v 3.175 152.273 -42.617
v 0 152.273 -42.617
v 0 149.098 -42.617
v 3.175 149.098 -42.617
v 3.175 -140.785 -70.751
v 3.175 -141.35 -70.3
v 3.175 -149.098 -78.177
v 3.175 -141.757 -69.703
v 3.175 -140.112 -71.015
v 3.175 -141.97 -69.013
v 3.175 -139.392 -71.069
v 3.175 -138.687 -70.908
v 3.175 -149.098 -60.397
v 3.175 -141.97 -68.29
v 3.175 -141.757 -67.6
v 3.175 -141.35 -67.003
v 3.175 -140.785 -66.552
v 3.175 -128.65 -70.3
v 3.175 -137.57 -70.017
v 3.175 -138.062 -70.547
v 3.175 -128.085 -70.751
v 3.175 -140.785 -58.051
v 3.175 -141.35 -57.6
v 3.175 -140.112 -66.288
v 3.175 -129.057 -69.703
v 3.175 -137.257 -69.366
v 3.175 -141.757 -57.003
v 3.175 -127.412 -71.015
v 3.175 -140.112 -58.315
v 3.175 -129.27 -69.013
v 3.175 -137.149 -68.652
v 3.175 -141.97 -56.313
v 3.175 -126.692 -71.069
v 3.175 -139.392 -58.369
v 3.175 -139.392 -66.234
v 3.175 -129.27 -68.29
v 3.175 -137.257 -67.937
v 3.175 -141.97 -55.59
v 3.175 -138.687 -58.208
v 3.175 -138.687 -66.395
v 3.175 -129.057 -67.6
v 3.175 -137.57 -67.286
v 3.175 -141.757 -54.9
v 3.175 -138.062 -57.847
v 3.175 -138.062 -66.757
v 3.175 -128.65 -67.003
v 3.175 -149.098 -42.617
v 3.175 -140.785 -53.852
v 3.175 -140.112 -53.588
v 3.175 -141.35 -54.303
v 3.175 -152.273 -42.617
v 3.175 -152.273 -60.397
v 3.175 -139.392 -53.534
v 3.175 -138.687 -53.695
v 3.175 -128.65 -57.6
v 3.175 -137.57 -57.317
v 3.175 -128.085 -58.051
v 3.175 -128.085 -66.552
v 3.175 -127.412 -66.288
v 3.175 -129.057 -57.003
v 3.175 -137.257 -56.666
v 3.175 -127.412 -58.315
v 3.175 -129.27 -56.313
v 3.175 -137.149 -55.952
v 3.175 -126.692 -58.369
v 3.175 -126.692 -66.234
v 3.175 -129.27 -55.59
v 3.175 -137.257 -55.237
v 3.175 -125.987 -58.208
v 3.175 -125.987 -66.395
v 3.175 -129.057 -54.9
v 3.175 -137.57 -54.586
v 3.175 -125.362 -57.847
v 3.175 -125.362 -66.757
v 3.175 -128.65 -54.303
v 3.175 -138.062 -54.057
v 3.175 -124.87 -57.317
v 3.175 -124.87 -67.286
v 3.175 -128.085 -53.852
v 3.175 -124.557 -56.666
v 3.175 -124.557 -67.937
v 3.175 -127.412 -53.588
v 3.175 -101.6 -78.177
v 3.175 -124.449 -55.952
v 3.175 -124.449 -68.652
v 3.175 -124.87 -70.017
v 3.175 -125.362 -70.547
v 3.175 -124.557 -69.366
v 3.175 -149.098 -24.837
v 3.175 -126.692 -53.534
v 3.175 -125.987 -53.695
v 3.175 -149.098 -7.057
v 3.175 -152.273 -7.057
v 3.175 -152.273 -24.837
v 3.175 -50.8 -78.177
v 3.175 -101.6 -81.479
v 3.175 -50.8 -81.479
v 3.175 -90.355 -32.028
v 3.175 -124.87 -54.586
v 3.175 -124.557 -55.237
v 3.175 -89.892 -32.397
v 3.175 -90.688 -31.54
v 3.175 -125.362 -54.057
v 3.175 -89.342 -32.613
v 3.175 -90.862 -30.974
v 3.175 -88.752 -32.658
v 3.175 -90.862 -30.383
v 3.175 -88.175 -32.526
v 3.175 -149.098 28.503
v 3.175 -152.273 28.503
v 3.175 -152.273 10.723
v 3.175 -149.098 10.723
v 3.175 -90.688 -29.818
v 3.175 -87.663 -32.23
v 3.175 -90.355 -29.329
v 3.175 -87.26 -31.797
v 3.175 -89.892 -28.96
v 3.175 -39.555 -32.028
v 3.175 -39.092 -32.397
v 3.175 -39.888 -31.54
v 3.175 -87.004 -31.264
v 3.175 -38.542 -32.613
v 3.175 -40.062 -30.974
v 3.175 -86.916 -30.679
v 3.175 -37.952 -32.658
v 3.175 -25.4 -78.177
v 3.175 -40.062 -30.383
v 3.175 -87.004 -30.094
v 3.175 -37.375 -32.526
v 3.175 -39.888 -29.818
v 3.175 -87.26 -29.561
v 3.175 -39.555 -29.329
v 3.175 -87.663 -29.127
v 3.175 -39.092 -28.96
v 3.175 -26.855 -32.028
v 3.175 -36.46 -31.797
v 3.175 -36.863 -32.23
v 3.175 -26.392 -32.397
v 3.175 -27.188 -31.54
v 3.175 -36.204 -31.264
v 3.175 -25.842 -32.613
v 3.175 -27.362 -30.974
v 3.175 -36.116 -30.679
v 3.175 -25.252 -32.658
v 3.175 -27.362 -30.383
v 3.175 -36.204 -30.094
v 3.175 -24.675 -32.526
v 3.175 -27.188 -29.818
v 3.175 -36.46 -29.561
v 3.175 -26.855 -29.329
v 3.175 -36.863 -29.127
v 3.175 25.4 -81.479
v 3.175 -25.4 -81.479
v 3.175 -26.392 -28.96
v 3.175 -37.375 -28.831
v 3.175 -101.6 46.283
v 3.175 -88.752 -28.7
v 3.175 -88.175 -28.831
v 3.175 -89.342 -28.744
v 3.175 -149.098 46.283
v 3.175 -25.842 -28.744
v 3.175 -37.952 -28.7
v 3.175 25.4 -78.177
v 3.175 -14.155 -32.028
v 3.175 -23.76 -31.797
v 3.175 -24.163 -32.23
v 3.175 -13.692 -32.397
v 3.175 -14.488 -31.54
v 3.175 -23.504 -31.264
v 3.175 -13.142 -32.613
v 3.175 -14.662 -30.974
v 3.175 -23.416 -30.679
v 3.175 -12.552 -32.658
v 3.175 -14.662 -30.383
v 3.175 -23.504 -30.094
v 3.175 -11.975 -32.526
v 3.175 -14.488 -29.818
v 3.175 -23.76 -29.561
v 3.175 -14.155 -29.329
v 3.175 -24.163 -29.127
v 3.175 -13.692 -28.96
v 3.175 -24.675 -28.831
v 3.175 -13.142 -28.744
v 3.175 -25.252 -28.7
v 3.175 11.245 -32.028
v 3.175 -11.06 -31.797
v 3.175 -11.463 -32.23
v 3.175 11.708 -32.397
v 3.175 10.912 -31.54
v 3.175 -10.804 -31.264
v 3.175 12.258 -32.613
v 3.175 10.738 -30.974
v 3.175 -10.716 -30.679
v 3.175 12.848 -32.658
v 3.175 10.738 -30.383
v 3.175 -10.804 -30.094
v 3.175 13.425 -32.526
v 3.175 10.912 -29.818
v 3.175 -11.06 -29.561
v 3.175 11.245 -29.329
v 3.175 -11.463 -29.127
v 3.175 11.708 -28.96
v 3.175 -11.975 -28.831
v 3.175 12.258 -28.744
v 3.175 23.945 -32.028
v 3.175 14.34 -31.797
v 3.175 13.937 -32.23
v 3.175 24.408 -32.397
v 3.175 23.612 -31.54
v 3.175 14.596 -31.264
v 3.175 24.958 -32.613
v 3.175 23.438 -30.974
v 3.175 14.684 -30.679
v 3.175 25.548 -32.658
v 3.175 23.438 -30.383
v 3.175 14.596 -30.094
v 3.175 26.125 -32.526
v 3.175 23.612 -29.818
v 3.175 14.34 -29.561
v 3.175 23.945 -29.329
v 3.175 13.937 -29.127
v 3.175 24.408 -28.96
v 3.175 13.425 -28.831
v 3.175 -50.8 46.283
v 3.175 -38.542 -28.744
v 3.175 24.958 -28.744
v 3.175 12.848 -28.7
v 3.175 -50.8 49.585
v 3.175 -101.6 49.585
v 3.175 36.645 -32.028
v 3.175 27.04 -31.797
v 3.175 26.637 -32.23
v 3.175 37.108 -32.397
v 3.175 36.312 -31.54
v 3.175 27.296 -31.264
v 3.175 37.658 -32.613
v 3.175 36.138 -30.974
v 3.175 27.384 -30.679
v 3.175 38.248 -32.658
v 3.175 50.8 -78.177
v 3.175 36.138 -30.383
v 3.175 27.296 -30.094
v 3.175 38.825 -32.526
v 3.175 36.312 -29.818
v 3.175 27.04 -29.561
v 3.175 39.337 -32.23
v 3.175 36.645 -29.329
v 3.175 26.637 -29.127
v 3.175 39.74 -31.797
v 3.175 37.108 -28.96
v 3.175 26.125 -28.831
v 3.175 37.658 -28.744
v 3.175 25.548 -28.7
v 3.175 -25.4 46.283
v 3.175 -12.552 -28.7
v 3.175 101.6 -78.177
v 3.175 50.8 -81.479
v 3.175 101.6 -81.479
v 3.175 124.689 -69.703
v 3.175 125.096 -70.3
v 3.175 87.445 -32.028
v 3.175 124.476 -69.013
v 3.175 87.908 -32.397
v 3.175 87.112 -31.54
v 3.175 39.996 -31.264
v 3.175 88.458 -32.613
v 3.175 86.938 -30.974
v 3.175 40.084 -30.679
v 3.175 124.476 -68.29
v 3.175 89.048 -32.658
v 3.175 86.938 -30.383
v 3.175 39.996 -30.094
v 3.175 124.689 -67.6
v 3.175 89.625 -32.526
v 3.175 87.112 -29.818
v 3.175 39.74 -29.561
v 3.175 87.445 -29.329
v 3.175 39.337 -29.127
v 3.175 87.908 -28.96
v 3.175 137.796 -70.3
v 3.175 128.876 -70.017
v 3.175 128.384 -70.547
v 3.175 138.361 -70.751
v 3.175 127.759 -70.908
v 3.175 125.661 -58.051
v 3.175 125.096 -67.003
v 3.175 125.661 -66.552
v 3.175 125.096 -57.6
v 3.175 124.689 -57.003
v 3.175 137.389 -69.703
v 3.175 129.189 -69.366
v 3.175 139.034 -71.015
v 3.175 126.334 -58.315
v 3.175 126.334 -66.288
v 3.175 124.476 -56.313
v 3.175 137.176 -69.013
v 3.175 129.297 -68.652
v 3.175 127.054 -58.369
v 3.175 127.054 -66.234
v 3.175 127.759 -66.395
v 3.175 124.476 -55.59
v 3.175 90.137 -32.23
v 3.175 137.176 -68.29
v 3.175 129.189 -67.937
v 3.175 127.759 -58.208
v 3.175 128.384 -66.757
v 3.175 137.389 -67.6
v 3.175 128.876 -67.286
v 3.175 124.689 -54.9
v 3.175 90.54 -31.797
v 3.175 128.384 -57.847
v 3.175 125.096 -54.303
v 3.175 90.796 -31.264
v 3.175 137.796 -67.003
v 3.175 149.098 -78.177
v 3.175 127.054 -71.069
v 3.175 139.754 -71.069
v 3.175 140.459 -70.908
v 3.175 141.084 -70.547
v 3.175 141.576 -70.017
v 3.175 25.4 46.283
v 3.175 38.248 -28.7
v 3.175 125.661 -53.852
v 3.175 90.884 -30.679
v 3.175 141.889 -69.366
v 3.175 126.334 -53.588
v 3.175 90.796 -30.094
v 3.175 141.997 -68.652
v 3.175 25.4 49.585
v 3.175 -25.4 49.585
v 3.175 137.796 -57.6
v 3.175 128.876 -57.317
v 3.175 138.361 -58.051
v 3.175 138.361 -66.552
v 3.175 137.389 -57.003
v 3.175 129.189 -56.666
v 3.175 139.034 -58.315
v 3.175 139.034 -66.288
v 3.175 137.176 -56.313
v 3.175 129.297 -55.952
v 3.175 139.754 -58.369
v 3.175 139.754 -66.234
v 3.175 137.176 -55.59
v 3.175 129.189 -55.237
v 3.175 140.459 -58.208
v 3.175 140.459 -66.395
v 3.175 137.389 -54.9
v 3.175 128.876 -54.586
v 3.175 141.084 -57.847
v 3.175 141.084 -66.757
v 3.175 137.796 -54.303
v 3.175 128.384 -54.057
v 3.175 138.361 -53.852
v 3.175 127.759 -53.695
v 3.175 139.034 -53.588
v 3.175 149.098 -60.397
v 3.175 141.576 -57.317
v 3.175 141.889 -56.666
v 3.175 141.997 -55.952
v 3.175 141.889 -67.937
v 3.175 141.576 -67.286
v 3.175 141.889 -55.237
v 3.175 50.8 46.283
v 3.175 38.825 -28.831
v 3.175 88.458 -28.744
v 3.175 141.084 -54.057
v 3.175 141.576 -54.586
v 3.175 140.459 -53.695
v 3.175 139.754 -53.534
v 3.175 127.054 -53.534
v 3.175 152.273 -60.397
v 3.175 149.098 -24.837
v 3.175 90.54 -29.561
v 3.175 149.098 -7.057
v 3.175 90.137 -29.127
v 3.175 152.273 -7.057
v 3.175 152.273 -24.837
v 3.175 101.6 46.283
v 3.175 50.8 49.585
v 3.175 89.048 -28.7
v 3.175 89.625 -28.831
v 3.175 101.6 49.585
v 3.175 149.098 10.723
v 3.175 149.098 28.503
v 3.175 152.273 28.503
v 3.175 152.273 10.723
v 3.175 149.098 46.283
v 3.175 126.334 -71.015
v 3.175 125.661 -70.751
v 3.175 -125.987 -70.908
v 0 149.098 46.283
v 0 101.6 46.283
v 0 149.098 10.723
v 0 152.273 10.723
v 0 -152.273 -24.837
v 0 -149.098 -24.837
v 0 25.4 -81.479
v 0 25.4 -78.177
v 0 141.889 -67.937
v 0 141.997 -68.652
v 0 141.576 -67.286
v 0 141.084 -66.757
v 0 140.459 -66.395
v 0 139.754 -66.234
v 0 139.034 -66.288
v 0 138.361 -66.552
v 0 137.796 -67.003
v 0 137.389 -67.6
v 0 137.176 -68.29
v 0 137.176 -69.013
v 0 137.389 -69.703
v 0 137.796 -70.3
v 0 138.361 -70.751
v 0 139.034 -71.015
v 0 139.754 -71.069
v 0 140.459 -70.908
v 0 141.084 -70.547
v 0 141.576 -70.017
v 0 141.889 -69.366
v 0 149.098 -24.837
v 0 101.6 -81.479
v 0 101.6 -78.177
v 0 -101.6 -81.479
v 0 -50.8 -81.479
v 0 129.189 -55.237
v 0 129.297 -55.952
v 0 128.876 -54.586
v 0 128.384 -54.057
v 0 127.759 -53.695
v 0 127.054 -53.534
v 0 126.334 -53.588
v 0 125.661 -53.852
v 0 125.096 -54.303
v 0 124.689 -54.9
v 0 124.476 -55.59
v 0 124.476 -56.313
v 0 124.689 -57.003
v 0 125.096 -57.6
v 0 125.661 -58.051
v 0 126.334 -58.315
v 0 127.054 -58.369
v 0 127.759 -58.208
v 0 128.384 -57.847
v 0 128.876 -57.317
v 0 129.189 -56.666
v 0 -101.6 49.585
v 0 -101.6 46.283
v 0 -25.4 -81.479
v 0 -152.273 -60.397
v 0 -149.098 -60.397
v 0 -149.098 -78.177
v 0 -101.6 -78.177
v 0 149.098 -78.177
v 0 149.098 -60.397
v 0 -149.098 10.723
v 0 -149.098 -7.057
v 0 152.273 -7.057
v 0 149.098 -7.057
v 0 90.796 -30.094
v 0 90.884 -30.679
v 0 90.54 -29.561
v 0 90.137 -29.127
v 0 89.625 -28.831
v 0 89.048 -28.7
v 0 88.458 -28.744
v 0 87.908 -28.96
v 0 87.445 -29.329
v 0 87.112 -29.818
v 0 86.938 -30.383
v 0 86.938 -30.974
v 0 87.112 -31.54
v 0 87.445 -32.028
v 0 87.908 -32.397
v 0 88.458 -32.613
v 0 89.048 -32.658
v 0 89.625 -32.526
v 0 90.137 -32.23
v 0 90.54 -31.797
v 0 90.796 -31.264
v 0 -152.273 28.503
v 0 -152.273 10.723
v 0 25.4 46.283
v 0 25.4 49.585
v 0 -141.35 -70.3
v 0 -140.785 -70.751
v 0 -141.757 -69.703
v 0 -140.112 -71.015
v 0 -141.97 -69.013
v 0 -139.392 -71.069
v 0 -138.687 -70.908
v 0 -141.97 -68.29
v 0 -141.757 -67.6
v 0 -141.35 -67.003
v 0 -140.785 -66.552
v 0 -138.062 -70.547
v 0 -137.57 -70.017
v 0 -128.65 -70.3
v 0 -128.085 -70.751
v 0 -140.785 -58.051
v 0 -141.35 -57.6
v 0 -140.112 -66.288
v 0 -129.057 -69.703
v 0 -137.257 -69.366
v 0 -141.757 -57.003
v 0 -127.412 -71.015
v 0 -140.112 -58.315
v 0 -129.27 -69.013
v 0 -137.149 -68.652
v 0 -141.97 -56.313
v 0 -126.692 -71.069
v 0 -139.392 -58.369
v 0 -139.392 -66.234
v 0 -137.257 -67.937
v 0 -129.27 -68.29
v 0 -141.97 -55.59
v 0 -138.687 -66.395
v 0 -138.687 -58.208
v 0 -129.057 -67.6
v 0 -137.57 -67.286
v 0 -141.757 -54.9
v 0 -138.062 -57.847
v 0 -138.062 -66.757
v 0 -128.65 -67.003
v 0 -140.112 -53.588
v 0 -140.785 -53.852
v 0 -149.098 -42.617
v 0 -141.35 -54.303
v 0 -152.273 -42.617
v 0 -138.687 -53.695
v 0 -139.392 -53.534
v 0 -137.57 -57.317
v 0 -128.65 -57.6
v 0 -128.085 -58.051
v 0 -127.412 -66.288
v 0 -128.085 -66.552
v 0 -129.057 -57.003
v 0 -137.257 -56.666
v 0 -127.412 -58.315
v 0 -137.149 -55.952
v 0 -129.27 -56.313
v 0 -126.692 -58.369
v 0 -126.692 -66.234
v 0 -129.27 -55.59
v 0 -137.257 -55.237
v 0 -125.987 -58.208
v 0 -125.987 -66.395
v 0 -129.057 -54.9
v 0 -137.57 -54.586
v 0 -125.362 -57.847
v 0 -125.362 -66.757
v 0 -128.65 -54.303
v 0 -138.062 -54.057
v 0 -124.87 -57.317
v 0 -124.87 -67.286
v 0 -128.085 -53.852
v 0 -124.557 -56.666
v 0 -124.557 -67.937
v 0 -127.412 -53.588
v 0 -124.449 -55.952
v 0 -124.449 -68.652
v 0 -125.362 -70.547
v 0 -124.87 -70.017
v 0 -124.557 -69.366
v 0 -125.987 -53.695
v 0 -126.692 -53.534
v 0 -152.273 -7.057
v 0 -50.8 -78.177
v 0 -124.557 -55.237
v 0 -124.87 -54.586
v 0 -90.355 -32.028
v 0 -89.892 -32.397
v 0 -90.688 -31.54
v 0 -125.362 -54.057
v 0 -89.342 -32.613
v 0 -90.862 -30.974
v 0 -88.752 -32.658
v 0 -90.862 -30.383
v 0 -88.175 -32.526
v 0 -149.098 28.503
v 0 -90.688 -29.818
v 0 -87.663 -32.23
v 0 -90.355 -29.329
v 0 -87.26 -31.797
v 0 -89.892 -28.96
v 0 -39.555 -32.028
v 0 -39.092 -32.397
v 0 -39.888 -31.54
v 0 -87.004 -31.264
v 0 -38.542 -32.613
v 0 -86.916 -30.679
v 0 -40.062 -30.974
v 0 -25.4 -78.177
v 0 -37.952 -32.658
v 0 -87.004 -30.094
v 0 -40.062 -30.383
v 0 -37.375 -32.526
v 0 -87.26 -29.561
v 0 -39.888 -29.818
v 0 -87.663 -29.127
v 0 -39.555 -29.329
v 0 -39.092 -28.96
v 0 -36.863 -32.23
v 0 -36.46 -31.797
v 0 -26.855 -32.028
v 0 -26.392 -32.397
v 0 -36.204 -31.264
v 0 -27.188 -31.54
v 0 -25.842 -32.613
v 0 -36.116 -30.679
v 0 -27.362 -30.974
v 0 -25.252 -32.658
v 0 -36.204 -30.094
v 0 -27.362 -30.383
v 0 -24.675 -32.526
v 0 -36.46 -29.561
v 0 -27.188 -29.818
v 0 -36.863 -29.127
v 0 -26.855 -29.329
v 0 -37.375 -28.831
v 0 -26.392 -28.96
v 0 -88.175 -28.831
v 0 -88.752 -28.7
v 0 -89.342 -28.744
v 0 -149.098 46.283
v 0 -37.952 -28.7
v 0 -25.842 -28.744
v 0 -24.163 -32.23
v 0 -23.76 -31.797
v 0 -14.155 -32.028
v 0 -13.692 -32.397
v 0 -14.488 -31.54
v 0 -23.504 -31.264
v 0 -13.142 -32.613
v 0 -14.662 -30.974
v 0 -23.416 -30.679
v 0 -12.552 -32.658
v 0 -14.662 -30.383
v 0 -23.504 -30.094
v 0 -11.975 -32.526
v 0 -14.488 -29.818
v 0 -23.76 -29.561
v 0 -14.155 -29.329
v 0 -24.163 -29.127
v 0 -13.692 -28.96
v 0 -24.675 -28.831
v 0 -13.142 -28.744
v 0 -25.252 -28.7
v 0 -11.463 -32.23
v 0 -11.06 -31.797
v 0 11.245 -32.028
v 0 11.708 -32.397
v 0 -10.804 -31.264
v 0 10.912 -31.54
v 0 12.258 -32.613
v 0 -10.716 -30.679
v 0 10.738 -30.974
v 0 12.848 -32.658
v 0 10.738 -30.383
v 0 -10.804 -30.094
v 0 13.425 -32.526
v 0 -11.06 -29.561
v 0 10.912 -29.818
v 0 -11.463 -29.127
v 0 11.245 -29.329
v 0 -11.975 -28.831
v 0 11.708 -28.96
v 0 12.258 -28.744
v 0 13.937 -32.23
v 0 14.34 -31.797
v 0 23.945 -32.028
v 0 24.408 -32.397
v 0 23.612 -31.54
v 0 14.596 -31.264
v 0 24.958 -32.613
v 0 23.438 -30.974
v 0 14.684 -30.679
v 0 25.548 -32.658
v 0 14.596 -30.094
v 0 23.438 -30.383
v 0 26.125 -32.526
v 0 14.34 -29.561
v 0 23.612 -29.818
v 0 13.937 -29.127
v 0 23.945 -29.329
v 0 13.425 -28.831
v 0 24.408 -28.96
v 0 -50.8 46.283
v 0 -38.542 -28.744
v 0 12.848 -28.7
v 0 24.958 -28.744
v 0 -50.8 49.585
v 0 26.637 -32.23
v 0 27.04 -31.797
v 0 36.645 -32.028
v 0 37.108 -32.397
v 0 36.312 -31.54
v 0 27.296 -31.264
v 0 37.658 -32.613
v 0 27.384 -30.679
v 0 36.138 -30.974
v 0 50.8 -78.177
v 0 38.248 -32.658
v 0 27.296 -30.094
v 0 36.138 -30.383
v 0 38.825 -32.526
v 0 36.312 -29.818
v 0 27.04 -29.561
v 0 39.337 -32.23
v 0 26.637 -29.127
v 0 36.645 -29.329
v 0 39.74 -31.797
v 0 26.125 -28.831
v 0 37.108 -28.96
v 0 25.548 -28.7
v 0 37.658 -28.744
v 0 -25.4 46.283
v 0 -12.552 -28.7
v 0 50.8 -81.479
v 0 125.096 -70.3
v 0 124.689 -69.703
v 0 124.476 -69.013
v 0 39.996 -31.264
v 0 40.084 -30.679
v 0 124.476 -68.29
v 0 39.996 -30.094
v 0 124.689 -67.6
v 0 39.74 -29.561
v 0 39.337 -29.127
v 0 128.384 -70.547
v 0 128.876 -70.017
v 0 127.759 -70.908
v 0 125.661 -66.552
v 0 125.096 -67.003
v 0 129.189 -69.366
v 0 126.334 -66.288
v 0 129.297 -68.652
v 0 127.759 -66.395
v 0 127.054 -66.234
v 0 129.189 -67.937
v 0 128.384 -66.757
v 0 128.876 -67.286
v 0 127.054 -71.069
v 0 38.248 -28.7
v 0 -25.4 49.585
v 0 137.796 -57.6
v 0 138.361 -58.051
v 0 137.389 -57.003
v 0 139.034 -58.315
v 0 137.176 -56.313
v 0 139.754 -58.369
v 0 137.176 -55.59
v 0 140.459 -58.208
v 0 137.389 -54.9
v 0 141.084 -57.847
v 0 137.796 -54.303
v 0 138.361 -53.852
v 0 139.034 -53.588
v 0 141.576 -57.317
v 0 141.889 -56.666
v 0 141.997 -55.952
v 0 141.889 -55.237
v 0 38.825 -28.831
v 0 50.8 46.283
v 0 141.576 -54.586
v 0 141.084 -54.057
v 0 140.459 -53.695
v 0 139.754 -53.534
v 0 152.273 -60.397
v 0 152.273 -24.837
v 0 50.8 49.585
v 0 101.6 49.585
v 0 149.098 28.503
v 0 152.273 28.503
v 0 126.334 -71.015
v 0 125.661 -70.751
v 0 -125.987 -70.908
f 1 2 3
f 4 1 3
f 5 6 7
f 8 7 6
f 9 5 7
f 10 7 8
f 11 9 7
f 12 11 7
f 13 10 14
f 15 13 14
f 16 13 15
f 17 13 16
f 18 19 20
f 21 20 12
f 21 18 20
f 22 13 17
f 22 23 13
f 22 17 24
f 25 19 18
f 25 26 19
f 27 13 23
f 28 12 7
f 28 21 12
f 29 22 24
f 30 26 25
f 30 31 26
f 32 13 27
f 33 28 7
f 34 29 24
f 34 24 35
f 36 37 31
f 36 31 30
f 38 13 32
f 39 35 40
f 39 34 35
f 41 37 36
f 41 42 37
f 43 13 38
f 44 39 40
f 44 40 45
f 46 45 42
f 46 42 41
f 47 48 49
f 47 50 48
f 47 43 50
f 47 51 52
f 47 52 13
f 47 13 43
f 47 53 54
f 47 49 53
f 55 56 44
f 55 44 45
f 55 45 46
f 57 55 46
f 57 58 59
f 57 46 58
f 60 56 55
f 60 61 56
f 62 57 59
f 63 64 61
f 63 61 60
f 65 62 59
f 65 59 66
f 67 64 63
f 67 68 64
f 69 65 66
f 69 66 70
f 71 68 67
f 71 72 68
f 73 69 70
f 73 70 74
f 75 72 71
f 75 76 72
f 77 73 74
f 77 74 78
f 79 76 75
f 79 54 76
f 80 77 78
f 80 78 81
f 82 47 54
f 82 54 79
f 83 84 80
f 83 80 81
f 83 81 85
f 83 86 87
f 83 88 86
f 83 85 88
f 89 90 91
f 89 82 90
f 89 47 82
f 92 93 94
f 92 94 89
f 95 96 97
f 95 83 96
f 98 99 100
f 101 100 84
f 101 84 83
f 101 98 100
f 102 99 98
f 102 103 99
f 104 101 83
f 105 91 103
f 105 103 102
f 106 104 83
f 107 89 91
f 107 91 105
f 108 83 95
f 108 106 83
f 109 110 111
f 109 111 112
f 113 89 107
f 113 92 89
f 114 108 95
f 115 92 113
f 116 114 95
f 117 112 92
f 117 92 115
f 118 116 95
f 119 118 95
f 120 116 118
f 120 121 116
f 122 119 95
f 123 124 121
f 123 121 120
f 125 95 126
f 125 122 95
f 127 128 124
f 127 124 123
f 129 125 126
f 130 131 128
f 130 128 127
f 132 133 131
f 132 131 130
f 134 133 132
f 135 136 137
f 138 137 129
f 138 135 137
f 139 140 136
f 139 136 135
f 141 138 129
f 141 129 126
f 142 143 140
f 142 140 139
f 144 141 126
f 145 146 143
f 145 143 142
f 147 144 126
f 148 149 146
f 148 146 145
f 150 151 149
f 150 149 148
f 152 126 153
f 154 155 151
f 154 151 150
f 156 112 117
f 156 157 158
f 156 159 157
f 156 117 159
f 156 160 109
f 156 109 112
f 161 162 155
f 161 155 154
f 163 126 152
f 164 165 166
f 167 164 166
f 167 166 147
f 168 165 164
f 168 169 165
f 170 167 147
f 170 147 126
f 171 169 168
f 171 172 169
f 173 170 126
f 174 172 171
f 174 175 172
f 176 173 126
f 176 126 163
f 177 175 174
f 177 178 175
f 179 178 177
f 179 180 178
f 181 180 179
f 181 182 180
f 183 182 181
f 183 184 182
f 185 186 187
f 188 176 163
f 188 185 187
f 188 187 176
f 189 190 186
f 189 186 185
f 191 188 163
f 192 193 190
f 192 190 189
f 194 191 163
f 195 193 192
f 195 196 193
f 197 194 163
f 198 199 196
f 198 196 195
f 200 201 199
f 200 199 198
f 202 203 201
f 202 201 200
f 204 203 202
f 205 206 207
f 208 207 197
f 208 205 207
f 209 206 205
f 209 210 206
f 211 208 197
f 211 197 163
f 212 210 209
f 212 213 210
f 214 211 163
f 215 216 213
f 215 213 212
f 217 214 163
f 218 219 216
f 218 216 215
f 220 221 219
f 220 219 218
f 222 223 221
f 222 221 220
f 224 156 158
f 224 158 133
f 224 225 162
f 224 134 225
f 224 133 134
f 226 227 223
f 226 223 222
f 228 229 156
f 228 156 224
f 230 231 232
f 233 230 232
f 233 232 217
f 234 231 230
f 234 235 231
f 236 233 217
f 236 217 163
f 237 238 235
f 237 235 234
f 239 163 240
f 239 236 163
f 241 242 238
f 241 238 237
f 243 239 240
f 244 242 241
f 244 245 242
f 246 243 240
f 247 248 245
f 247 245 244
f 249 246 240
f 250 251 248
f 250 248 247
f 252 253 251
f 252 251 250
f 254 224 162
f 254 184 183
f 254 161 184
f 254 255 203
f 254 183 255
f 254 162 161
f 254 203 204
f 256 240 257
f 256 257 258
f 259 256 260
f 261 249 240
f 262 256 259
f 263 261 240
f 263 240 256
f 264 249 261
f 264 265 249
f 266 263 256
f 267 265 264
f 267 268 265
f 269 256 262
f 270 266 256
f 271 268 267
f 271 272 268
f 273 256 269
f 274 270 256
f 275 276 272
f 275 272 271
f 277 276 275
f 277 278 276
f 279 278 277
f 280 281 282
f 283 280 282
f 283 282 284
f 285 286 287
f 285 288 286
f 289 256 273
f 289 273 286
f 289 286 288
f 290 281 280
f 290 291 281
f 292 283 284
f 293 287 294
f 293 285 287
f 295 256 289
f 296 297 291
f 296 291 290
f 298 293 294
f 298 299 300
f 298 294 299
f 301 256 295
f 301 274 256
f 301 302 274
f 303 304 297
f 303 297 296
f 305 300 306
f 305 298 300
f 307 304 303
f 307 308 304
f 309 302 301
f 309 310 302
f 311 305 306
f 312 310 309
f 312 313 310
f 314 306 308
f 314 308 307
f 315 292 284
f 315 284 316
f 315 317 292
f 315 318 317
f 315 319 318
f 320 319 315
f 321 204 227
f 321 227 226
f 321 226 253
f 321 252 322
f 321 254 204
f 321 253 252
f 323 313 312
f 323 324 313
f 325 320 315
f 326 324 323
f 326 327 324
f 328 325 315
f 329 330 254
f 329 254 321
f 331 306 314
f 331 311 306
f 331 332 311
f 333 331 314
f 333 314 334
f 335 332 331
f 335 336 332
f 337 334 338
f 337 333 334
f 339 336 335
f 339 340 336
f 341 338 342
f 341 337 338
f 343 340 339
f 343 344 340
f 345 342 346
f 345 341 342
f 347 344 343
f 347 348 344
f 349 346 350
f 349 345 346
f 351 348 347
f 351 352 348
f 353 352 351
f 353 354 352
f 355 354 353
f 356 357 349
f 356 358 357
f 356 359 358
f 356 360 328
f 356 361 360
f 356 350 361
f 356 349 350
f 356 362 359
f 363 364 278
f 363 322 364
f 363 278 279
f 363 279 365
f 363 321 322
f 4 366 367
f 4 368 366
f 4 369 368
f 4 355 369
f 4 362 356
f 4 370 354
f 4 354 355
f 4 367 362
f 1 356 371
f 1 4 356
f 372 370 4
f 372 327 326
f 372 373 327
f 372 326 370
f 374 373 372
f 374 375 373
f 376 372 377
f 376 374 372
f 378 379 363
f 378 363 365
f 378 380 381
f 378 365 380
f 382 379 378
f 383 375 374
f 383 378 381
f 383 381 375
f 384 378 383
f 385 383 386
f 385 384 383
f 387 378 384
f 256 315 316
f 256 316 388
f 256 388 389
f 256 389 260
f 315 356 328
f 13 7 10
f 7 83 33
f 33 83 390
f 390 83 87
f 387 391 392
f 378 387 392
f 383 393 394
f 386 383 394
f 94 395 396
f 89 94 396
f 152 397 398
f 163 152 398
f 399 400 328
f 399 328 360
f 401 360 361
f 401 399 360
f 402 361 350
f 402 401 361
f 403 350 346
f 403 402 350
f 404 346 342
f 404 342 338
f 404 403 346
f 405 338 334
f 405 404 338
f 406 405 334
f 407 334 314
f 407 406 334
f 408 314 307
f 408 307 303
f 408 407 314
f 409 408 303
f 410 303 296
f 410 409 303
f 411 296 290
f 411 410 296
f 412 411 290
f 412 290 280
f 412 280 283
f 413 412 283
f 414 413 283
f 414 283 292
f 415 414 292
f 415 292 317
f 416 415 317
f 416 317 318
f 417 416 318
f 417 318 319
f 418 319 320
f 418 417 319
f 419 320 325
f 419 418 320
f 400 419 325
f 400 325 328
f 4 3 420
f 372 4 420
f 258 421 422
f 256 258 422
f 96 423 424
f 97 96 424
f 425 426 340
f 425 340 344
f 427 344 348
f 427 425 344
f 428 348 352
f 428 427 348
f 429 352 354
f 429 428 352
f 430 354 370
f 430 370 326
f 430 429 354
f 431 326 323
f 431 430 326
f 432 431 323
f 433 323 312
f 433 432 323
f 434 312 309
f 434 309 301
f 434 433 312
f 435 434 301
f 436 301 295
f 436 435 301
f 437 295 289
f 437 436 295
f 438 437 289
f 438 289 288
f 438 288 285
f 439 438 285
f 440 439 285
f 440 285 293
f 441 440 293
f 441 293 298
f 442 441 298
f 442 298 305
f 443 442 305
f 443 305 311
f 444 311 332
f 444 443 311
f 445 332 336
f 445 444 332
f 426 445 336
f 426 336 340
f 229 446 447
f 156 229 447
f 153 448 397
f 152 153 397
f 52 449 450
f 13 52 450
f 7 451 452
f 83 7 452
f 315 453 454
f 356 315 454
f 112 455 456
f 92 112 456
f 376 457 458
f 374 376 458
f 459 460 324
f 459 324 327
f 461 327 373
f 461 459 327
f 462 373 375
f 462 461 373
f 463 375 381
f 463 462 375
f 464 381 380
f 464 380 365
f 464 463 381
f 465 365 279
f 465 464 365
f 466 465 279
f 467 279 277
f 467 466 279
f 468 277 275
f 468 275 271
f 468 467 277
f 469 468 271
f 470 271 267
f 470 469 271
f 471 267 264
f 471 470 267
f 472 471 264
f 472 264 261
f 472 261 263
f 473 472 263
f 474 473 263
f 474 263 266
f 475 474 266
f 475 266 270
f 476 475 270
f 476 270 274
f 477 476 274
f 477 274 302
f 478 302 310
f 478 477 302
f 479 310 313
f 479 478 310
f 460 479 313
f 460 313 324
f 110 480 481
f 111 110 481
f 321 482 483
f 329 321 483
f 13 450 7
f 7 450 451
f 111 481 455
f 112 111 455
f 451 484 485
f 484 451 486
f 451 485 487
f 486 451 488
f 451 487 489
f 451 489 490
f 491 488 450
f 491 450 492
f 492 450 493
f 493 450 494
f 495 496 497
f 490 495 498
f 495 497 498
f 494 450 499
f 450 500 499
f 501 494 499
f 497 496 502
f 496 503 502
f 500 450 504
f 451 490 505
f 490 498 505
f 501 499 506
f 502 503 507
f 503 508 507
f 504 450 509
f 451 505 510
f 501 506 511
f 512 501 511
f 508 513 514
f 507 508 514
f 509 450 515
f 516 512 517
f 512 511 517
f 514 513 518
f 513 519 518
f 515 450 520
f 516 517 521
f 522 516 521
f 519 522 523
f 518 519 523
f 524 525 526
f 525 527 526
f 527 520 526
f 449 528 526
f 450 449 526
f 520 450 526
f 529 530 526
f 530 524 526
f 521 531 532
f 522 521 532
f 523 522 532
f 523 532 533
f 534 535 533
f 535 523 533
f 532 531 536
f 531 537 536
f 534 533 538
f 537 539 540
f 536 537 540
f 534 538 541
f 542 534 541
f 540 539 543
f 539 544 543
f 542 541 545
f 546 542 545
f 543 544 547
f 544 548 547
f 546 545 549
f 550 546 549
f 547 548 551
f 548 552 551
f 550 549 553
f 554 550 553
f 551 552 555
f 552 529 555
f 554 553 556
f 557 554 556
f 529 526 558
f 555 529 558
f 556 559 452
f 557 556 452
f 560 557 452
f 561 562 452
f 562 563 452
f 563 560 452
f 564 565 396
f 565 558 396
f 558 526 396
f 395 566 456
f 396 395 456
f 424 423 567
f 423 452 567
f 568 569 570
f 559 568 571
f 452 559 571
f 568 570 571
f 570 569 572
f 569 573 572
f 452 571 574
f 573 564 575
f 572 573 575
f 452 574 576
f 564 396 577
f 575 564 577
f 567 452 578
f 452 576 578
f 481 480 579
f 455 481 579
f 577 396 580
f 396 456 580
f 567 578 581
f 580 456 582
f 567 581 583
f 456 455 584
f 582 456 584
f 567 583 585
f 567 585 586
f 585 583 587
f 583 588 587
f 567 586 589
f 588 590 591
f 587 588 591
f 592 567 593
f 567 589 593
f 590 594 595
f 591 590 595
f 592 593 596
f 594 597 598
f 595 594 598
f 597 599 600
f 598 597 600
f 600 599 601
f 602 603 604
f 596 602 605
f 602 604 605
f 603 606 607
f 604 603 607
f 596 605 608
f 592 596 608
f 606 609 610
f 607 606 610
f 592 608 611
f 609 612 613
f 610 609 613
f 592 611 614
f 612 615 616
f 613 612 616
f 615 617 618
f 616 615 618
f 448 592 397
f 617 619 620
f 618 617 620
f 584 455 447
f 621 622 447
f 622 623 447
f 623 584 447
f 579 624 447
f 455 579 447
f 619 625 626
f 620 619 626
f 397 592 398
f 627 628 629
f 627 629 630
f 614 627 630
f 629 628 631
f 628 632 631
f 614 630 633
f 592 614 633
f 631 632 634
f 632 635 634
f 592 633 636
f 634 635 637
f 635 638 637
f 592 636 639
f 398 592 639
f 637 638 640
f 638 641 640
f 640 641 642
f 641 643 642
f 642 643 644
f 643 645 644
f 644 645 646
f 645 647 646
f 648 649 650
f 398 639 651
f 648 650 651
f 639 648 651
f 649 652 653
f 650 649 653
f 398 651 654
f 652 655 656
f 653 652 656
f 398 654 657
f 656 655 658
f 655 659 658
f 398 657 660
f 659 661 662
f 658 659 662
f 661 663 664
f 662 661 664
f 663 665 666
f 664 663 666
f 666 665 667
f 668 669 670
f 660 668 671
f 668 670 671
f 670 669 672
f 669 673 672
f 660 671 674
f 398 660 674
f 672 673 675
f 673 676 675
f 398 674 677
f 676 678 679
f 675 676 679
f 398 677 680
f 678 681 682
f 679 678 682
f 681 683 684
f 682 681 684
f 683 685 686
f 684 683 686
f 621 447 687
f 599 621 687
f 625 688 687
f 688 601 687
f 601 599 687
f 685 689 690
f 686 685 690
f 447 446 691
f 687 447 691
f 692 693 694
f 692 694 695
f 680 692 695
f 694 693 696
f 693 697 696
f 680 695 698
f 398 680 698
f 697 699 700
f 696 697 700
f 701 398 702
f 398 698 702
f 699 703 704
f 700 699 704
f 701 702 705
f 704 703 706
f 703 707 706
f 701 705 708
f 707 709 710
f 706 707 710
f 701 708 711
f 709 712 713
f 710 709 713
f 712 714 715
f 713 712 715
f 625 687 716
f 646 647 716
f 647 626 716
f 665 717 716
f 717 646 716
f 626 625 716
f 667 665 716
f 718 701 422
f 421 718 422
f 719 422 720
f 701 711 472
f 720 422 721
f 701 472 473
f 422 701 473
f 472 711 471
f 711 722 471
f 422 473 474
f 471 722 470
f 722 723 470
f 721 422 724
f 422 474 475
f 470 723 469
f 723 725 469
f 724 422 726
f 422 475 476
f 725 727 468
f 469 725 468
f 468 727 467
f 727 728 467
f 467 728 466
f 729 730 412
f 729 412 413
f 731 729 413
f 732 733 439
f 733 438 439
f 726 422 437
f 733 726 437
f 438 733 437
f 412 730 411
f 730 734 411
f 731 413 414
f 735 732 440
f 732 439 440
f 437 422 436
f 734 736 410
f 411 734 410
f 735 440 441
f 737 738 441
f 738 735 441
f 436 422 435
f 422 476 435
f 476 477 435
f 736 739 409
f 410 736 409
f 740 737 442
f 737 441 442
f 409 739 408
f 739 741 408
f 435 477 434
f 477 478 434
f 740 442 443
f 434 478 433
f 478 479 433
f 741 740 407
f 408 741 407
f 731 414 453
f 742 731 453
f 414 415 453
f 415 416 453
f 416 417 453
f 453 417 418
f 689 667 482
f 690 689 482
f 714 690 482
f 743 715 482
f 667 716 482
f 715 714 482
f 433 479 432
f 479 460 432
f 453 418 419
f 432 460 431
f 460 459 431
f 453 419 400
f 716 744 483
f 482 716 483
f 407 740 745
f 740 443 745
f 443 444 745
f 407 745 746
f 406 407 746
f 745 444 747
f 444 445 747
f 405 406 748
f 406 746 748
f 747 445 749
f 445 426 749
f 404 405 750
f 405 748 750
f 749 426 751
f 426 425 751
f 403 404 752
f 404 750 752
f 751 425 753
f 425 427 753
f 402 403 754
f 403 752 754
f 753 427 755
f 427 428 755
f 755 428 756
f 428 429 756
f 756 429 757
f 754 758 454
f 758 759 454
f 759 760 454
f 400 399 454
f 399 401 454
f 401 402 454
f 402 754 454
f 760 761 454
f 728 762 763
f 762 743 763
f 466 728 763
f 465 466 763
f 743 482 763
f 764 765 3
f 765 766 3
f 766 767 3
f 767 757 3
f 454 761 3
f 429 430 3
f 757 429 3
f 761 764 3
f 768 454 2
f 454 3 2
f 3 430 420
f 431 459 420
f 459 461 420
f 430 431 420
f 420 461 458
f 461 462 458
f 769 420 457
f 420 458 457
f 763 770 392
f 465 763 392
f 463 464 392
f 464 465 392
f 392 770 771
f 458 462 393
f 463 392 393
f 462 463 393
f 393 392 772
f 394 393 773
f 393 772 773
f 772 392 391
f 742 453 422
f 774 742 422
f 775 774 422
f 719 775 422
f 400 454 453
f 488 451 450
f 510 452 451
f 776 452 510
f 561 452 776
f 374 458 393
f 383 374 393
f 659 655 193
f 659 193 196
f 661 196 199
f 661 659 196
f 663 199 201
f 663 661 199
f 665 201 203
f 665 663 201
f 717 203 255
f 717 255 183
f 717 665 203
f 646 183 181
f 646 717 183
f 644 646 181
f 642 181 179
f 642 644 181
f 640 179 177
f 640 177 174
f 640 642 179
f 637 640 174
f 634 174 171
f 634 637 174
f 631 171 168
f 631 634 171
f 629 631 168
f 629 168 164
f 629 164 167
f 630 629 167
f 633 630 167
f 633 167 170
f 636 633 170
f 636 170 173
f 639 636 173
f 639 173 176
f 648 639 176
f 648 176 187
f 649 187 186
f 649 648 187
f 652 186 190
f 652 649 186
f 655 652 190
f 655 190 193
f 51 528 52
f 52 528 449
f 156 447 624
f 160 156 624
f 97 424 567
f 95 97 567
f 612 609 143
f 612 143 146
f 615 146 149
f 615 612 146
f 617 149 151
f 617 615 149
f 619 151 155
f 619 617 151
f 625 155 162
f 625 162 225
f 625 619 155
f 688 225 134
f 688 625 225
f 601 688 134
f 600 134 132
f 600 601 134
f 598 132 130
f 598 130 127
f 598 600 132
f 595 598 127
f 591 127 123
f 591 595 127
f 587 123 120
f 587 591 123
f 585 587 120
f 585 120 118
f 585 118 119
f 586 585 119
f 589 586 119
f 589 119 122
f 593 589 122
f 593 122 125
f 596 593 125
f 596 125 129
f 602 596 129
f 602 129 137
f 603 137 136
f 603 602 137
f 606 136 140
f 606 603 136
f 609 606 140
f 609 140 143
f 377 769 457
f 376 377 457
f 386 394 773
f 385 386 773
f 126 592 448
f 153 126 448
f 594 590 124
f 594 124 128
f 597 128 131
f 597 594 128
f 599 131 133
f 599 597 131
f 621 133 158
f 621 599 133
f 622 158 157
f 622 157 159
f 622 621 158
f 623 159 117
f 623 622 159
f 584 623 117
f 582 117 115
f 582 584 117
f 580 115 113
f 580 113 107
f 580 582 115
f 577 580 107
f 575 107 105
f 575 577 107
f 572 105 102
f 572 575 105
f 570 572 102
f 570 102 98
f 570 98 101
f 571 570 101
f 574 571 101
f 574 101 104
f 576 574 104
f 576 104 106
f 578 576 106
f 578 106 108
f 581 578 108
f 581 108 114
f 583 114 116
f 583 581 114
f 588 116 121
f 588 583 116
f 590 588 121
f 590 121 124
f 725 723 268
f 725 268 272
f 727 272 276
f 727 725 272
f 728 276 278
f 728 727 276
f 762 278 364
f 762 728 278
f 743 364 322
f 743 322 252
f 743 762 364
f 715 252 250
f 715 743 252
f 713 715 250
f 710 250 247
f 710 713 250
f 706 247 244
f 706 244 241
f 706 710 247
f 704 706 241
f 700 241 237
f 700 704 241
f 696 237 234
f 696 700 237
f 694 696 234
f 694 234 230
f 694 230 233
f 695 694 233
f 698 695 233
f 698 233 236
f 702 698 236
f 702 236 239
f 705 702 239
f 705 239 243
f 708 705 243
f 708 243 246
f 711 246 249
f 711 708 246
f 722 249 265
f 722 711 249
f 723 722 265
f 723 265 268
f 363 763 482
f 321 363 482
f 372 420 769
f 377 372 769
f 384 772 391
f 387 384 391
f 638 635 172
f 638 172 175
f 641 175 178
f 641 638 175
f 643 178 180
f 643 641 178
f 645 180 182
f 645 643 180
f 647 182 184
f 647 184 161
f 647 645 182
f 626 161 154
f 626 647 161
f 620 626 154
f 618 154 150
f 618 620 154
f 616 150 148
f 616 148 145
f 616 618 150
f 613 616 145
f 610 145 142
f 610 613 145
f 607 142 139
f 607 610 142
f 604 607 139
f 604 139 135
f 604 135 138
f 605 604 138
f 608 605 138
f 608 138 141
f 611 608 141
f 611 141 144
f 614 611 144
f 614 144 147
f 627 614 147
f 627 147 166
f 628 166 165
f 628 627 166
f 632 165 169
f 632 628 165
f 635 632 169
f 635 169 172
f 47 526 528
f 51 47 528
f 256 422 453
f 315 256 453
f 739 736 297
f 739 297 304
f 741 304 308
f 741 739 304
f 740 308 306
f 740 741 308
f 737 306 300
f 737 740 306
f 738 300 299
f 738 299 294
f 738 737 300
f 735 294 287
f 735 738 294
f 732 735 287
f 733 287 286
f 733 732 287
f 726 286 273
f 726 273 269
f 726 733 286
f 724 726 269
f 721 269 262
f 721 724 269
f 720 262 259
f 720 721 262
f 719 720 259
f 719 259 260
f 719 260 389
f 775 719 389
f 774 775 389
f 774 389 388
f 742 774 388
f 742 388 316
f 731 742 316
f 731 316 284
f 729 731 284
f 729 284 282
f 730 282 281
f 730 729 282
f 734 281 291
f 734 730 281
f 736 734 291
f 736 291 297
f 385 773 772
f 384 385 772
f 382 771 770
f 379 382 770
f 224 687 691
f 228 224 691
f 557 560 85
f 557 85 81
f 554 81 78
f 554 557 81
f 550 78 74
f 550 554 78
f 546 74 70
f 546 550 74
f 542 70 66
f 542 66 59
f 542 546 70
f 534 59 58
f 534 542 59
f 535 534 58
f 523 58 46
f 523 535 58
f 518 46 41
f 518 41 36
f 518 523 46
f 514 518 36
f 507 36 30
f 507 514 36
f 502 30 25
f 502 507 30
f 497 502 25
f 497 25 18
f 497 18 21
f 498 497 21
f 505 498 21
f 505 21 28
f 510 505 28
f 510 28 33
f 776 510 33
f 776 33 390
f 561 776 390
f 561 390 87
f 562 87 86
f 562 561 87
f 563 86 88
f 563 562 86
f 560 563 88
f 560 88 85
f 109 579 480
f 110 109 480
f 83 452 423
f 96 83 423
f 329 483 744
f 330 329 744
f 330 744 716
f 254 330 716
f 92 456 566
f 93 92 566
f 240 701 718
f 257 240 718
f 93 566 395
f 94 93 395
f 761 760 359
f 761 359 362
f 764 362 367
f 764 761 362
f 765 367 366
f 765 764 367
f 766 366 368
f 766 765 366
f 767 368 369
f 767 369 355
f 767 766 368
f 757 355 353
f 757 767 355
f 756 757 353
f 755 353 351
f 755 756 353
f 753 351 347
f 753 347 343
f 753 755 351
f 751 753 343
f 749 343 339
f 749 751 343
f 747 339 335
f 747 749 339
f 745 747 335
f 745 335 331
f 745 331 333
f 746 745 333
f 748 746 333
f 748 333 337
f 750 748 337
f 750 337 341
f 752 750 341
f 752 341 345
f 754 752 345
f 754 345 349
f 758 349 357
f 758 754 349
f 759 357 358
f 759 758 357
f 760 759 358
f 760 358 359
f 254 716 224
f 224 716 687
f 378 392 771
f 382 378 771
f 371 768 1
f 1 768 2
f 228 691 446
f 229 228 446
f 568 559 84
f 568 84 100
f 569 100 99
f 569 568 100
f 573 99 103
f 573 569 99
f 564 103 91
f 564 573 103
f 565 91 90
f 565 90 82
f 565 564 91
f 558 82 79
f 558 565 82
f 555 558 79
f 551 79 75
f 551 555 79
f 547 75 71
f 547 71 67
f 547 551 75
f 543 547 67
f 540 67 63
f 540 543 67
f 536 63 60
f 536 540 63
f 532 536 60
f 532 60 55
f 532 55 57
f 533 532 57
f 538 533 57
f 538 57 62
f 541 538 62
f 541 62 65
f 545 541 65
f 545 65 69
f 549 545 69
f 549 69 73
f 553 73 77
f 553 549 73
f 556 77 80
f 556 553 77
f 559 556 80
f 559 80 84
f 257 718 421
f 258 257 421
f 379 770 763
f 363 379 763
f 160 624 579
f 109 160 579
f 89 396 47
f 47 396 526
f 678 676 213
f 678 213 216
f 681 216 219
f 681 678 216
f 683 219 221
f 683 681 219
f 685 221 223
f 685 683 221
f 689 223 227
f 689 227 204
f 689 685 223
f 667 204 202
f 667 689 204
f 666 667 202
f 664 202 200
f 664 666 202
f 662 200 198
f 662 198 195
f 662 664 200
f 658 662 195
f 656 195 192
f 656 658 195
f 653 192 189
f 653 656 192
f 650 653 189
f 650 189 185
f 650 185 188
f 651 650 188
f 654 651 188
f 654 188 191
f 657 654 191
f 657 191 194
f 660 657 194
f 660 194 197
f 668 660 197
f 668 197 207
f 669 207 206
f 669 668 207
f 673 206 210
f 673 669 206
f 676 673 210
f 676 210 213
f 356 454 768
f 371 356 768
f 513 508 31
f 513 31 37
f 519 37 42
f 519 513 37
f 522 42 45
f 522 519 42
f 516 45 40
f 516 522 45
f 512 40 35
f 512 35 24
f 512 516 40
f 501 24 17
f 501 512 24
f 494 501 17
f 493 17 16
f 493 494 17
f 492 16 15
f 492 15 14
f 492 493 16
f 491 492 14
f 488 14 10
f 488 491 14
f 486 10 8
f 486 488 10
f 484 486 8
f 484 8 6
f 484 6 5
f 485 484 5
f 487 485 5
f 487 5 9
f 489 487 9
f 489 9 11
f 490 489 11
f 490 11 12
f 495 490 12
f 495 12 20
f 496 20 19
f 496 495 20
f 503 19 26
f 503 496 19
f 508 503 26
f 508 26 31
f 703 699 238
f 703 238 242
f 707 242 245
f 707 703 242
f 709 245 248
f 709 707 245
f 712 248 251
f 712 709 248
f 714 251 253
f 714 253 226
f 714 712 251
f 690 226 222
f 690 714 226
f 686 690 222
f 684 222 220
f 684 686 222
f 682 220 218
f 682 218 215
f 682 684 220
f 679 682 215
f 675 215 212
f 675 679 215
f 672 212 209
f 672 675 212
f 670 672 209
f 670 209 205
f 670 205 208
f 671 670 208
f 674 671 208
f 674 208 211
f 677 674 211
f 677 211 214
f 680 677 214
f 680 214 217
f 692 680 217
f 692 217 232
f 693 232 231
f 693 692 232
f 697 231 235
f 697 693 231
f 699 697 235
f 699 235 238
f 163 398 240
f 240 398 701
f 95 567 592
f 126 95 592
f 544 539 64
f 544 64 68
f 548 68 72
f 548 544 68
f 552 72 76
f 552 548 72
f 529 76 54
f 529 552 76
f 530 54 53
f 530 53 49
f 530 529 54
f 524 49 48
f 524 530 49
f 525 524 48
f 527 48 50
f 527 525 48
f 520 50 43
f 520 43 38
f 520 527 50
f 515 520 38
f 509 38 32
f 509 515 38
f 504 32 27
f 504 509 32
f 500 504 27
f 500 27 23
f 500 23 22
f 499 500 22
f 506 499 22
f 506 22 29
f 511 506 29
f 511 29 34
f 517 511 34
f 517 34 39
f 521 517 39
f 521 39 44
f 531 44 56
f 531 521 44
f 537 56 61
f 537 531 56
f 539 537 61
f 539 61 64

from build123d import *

# Parameters (mm, degrees)
F0_R     = 2.424029
F0_R_2   = 1.984375
F1_DEPTH = 3.175


with BuildPart() as f1:
    # F0 (on Right) → F1 (new body)
    with BuildSketch(Plane.YZ):
        Polygon((-101.6, -81.478684), (-50.8, -81.478684), (-50.8, -78.176684), (-25.4, -78.176684), (-25.4, -81.478684), (25.4, -81.478684), (25.4, -78.176684), (50.8, -78.176684), (50.8, -81.478684), (101.6, -81.478684), (101.6, -78.176684), (149.098, -78.176684), (149.098, -60.396684), (152.273, -60.396684), (152.273, -42.616684), (149.098, -42.616684), (149.098, -24.836684), (152.273, -24.836684), (152.273, -7.056684), (149.098, -7.056684), (149.098, 10.723316), (152.273, 10.723316), (152.273, 28.503316), (149.098, 28.503316), (149.098, 46.283316), (101.6, 46.283316), (101.6, 49.585316), (50.8, 49.585316), (50.8, 46.283316), (25.4, 46.283316), (25.4, 49.585316), (-25.4, 49.585316), (-25.4, 46.283316), (-50.8, 46.283316), (-50.8, 49.585316), (-101.6, 49.585316), (-101.6, 46.283316), (-149.098, 46.283316), (-149.098, 28.503316), (-152.273, 28.503316), (-152.273, 10.723316), (-149.098, 10.723316), (-149.098, -7.056684), (-152.273, -7.056684), (-152.273, -24.836684), (-149.098, -24.836684), (-149.098, -42.616684), (-152.273, -42.616684), (-152.273, -60.396684), (-149.098, -60.396684), (-149.098, -78.176684), (-101.6, -78.176684), align=None)
        with Locations((-139.573, -68.651684)):
            Circle(F0_R, mode=Mode.SUBTRACT)
        with Locations((-126.873, -68.651684)):
            Circle(F0_R, mode=Mode.SUBTRACT)
        with Locations((-139.573, -55.951684)):
            Circle(F0_R, mode=Mode.SUBTRACT)
        with Locations((-126.873, -55.951684)):
            Circle(F0_R, mode=Mode.SUBTRACT)
        with Locations((-88.9, -30.678684)):
            Circle(F0_R_2, mode=Mode.SUBTRACT)
        with Locations((-38.1, -30.678684)):
            Circle(F0_R_2, mode=Mode.SUBTRACT)
        with Locations((-25.4, -30.678684)):
            Circle(F0_R_2, mode=Mode.SUBTRACT)
        with Locations((-12.7, -30.678684)):
            Circle(F0_R_2, mode=Mode.SUBTRACT)
        with Locations((126.873, -68.651684)):
            Circle(F0_R, mode=Mode.SUBTRACT)
        with Locations((139.573, -68.651684)):
            Circle(F0_R, mode=Mode.SUBTRACT)
        with Locations((126.873, -55.951684)):
            Circle(F0_R, mode=Mode.SUBTRACT)
        with Locations((139.573, -55.951684)):
            Circle(F0_R, mode=Mode.SUBTRACT)
        with Locations((12.7, -30.678684)):
            Circle(F0_R_2, mode=Mode.SUBTRACT)
        with Locations((25.4, -30.678684)):
            Circle(F0_R_2, mode=Mode.SUBTRACT)
        with Locations((38.1, -30.678684)):
            Circle(F0_R_2, mode=Mode.SUBTRACT)
        with Locations((88.9, -30.678684)):
            Circle(F0_R_2, mode=Mode.SUBTRACT)
    extrude(amount=F1_DEPTH)


solid = f1.part
